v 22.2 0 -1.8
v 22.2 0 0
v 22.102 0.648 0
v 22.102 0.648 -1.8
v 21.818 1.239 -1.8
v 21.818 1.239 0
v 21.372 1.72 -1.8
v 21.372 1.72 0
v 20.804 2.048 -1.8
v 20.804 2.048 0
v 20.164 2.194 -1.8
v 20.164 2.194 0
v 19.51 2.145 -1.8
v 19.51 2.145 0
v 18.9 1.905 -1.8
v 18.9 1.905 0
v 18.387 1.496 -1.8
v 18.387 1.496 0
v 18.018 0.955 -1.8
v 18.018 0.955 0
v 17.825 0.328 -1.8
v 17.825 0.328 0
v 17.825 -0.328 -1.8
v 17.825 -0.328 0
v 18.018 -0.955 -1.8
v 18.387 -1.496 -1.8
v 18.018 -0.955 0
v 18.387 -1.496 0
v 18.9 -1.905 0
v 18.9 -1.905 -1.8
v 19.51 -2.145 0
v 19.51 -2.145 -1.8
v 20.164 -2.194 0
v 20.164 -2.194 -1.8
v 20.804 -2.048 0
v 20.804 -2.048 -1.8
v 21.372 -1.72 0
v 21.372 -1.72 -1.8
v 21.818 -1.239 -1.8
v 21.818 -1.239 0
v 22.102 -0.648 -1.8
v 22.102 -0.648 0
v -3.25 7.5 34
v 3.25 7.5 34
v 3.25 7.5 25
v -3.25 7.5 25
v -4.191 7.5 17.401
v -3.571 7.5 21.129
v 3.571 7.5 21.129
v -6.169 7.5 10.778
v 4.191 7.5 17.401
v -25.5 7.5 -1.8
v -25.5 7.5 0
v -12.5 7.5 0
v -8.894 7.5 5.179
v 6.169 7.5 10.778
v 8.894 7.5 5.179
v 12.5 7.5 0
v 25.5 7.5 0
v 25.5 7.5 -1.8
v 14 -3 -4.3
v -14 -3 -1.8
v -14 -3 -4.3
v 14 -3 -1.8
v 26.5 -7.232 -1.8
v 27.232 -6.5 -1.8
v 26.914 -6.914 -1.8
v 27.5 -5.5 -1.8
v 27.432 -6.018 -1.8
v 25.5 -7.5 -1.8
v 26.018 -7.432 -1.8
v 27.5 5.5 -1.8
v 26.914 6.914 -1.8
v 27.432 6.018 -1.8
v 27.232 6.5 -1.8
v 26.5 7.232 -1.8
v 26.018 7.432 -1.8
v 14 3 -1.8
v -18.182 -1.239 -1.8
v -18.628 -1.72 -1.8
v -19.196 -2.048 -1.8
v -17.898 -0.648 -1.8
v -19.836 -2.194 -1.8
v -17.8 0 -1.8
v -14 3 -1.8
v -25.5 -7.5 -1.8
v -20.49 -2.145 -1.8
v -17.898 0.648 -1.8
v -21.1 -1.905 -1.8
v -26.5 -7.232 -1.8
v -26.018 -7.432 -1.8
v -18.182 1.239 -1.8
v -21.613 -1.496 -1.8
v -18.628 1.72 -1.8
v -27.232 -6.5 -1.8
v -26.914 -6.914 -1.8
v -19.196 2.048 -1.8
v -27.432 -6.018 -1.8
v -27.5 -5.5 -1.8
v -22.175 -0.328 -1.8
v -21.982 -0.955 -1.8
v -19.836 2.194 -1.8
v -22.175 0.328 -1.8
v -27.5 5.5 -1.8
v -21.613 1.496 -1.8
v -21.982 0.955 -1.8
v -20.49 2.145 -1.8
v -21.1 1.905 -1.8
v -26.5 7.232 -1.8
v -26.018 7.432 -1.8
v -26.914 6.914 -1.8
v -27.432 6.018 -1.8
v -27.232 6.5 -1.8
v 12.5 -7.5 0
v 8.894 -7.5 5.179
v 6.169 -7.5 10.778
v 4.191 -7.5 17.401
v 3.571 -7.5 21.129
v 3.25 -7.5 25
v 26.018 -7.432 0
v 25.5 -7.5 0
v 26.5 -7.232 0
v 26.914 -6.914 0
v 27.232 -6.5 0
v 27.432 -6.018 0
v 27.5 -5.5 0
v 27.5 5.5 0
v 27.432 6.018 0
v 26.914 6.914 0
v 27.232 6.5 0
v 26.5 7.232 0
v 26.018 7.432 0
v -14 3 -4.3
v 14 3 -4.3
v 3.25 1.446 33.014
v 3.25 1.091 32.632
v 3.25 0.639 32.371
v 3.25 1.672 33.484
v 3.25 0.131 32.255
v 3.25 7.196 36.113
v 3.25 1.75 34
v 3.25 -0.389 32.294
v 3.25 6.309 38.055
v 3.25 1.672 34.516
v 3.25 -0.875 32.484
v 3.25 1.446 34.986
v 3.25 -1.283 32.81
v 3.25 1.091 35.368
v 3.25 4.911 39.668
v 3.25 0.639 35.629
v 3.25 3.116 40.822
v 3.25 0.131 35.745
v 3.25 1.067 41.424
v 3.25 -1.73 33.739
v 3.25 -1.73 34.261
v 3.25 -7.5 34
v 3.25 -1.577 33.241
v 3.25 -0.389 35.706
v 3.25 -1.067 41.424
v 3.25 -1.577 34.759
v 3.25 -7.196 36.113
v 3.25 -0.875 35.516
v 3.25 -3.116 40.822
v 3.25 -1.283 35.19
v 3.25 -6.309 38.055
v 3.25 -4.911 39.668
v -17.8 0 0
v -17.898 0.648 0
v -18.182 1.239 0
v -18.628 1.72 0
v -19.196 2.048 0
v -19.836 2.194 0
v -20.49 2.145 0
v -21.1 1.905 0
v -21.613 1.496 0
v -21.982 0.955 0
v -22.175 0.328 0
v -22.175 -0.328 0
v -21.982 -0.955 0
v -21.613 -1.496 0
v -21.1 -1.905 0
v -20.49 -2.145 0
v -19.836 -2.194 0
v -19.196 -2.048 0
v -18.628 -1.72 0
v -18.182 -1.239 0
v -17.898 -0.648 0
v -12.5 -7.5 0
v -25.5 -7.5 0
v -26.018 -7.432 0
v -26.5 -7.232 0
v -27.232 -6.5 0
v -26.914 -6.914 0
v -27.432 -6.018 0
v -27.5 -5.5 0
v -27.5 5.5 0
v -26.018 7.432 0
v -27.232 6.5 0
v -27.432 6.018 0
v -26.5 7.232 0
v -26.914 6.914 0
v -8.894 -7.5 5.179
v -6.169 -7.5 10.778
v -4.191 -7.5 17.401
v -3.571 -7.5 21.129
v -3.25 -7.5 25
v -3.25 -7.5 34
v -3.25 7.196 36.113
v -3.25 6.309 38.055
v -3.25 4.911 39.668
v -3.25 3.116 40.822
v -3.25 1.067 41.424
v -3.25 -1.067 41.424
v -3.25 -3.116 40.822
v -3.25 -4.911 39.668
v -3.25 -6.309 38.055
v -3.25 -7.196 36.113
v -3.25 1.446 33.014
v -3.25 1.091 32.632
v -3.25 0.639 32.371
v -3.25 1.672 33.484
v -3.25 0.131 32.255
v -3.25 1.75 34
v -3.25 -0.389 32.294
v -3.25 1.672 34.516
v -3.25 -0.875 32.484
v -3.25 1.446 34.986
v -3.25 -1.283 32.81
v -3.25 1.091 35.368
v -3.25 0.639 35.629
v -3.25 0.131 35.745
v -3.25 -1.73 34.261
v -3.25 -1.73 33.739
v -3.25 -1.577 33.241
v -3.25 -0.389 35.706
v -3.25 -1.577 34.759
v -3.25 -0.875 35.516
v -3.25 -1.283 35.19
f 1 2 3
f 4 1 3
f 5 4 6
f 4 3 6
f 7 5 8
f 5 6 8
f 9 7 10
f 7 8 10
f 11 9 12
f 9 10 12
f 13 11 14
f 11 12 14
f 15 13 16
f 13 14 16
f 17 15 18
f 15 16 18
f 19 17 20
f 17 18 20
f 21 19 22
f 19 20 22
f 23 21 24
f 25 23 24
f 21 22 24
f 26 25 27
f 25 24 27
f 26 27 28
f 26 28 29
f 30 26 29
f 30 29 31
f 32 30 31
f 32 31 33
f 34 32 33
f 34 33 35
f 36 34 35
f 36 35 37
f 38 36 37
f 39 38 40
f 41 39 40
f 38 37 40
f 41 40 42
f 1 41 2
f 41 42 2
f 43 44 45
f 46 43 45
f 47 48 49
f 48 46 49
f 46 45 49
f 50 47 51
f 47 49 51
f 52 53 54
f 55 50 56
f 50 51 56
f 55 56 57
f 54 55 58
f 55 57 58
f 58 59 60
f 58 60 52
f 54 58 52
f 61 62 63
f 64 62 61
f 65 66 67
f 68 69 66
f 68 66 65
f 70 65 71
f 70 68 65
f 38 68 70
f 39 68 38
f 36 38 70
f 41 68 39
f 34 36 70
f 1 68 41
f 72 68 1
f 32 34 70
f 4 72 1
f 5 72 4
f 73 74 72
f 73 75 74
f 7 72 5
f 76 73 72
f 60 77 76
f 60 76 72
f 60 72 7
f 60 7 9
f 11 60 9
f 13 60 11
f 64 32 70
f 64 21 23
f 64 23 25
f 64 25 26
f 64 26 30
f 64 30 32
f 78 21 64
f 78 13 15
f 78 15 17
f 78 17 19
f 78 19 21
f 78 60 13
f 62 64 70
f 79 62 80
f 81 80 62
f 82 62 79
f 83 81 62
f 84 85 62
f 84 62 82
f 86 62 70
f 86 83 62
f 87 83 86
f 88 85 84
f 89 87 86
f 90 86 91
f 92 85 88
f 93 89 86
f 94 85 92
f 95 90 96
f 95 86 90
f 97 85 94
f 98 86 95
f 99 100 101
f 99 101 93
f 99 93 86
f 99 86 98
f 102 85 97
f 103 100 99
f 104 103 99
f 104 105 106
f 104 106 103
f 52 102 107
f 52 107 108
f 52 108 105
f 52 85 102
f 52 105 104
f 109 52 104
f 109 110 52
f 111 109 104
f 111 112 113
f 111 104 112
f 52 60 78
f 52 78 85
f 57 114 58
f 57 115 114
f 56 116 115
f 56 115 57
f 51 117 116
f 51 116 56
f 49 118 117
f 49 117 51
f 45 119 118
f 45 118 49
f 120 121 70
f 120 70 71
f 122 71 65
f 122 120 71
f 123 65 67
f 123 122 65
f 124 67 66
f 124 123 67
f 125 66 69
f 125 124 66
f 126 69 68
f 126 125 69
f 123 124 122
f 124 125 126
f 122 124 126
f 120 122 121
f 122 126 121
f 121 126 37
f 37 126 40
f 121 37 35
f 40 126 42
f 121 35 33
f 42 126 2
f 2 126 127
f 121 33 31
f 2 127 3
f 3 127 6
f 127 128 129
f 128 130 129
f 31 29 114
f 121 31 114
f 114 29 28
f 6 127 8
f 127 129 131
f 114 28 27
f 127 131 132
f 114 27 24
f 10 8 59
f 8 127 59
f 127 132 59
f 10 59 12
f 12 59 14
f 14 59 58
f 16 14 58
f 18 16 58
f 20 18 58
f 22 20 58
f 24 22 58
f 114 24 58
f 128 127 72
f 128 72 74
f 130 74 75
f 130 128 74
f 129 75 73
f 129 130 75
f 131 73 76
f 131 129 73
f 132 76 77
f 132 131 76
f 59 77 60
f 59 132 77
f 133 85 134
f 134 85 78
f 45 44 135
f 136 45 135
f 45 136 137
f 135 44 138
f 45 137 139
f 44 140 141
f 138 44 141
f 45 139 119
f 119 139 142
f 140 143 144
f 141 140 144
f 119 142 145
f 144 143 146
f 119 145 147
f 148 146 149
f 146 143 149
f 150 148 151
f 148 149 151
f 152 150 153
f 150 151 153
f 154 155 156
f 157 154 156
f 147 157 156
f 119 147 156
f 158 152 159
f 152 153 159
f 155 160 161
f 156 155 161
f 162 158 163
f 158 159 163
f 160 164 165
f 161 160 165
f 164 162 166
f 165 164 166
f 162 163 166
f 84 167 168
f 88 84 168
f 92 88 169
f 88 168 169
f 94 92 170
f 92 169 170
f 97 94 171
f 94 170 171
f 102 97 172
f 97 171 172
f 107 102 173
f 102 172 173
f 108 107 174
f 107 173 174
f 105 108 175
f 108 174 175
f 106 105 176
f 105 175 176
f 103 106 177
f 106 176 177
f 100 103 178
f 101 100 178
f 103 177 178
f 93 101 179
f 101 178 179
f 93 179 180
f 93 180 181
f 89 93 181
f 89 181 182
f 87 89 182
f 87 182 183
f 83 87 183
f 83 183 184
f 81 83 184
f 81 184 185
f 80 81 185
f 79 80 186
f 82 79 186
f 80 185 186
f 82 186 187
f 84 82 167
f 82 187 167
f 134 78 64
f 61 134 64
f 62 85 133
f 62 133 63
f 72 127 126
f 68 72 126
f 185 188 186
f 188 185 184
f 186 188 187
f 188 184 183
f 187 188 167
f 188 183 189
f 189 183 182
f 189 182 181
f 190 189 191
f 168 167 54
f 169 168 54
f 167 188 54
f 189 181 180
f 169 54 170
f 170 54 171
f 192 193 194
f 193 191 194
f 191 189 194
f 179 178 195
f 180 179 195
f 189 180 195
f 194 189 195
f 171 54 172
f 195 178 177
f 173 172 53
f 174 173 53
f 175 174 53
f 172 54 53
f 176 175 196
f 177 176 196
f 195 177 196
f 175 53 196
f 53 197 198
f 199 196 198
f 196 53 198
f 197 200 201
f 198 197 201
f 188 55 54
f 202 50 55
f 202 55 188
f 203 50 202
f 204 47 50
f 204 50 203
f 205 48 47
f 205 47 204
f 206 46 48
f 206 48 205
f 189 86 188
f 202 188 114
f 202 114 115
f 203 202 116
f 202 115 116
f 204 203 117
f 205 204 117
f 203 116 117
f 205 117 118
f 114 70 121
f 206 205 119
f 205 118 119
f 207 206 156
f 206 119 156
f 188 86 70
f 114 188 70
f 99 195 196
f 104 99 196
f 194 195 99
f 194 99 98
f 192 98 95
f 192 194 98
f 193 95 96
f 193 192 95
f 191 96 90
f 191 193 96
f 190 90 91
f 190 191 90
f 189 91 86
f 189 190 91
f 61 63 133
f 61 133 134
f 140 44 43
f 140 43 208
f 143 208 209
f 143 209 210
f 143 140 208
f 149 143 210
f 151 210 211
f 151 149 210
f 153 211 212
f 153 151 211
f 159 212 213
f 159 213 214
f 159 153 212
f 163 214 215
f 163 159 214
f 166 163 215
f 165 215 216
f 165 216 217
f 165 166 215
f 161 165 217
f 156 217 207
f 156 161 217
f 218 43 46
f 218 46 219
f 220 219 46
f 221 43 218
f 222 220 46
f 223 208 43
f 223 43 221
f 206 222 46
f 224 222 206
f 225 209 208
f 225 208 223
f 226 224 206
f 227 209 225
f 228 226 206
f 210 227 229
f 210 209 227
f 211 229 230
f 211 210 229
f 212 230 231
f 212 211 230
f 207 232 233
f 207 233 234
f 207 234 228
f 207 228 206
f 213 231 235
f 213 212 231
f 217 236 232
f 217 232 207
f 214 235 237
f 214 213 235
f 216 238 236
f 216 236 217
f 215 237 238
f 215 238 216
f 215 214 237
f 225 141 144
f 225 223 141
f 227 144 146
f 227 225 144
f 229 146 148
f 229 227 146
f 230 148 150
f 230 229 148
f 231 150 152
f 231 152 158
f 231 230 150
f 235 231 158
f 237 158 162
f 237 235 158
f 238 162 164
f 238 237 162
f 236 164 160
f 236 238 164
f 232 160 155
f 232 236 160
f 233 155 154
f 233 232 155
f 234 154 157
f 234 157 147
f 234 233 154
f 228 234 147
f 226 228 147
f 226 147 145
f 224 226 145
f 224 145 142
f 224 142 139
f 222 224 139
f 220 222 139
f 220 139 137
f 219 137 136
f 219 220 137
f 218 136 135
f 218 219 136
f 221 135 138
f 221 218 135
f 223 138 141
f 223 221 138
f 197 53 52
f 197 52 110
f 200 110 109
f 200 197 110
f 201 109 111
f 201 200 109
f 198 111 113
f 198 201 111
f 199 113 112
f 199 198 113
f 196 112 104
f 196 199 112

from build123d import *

# Parameters (mm, degrees)
SKETCH014_R  = 2.2
PAD010_DEPTH = 1.8
SKETCH016_W  = 25
SKETCH016_H  = 15
SKETCH025_W  = 18
SKETCH025_H  = 15
SKETCH017_W  = 6.5
SKETCH017_H  = 15
SKETCH018_R  = 1.75
PAD011_DEPTH = 3.25
SKETCH015_W  = 28
SKETCH015_H  = 6
PAD012_DEPTH = 2.5


with BuildPart() as part:
    # Sketch014 → Pad010 (new body)
    with BuildSketch(Plane.XY):
        with BuildLine():
            Line((-25.5, 7.5), (25.5, 7.5))
            ThreePointArc((27.5, 5.5), (26.914214, 6.914214), (25.5, 7.5))
            Line((27.5, 5.5), (27.5, -5.5))
            ThreePointArc((25.5, -7.5), (26.914214, -6.914214), (27.5, -5.5))
            Line((25.5, -7.5), (-25.5, -7.5))
            ThreePointArc((-27.5, -5.5), (-26.914214, -6.914214), (-25.5, -7.5))
            Line((-27.5, -5.5), (-27.5, 5.5))
            ThreePointArc((-25.5, 7.5), (-26.914214, 6.914214), (-27.5, 5.5))
        make_face()
        with Locations((-20, 0)):
            Circle(SKETCH014_R, mode=Mode.SUBTRACT)
        with Locations((20, 0)):
            Circle(SKETCH014_R, mode=Mode.SUBTRACT)
    extrude(amount=-PAD010_DEPTH)

    # Sketch016 → AdditiveLoft section 0
    with BuildSketch(Plane.XY):
        Rectangle(SKETCH016_W, SKETCH016_H)
    # Sketch025 → AdditiveLoft section 1
    with BuildSketch(Plane.XY.offset(5)):
        Rectangle(SKETCH025_W, SKETCH025_H)
    # Sketch017 → AdditiveLoft section 2
    with BuildSketch(Plane.XY.offset(25)):
        Rectangle(SKETCH017_W, SKETCH017_H)
    loft()

    # Sketch018 → Pad011 (join, symmetric)
    with BuildSketch(Plane(origin=(0, 0, 25), x_dir=(0, 1, 0), z_dir=(1, 0, 0))):
        with BuildLine():
            Line((7.5, 0), (-7.5, 0))
            Line((-7.5, 0), (-7.5, 9))
            ThreePointArc((7.5, 9), (0, 16.5), (-7.5, 9))
            Line((7.5, 9), (7.5, 0))
        make_face()
        with Locations((0, 9)):
            Circle(SKETCH018_R, mode=Mode.SUBTRACT)
    extrude(amount=PAD011_DEPTH, both=True)

    # Sketch015 → Pad012 (join)
    with BuildSketch(Plane(origin=(0, 0, -1.8), x_dir=(1, 0, 0), z_dir=(0, 0, -1))):
        Rectangle(SKETCH015_W, SKETCH015_H)
    extrude(amount=PAD012_DEPTH)


solid = part.part
